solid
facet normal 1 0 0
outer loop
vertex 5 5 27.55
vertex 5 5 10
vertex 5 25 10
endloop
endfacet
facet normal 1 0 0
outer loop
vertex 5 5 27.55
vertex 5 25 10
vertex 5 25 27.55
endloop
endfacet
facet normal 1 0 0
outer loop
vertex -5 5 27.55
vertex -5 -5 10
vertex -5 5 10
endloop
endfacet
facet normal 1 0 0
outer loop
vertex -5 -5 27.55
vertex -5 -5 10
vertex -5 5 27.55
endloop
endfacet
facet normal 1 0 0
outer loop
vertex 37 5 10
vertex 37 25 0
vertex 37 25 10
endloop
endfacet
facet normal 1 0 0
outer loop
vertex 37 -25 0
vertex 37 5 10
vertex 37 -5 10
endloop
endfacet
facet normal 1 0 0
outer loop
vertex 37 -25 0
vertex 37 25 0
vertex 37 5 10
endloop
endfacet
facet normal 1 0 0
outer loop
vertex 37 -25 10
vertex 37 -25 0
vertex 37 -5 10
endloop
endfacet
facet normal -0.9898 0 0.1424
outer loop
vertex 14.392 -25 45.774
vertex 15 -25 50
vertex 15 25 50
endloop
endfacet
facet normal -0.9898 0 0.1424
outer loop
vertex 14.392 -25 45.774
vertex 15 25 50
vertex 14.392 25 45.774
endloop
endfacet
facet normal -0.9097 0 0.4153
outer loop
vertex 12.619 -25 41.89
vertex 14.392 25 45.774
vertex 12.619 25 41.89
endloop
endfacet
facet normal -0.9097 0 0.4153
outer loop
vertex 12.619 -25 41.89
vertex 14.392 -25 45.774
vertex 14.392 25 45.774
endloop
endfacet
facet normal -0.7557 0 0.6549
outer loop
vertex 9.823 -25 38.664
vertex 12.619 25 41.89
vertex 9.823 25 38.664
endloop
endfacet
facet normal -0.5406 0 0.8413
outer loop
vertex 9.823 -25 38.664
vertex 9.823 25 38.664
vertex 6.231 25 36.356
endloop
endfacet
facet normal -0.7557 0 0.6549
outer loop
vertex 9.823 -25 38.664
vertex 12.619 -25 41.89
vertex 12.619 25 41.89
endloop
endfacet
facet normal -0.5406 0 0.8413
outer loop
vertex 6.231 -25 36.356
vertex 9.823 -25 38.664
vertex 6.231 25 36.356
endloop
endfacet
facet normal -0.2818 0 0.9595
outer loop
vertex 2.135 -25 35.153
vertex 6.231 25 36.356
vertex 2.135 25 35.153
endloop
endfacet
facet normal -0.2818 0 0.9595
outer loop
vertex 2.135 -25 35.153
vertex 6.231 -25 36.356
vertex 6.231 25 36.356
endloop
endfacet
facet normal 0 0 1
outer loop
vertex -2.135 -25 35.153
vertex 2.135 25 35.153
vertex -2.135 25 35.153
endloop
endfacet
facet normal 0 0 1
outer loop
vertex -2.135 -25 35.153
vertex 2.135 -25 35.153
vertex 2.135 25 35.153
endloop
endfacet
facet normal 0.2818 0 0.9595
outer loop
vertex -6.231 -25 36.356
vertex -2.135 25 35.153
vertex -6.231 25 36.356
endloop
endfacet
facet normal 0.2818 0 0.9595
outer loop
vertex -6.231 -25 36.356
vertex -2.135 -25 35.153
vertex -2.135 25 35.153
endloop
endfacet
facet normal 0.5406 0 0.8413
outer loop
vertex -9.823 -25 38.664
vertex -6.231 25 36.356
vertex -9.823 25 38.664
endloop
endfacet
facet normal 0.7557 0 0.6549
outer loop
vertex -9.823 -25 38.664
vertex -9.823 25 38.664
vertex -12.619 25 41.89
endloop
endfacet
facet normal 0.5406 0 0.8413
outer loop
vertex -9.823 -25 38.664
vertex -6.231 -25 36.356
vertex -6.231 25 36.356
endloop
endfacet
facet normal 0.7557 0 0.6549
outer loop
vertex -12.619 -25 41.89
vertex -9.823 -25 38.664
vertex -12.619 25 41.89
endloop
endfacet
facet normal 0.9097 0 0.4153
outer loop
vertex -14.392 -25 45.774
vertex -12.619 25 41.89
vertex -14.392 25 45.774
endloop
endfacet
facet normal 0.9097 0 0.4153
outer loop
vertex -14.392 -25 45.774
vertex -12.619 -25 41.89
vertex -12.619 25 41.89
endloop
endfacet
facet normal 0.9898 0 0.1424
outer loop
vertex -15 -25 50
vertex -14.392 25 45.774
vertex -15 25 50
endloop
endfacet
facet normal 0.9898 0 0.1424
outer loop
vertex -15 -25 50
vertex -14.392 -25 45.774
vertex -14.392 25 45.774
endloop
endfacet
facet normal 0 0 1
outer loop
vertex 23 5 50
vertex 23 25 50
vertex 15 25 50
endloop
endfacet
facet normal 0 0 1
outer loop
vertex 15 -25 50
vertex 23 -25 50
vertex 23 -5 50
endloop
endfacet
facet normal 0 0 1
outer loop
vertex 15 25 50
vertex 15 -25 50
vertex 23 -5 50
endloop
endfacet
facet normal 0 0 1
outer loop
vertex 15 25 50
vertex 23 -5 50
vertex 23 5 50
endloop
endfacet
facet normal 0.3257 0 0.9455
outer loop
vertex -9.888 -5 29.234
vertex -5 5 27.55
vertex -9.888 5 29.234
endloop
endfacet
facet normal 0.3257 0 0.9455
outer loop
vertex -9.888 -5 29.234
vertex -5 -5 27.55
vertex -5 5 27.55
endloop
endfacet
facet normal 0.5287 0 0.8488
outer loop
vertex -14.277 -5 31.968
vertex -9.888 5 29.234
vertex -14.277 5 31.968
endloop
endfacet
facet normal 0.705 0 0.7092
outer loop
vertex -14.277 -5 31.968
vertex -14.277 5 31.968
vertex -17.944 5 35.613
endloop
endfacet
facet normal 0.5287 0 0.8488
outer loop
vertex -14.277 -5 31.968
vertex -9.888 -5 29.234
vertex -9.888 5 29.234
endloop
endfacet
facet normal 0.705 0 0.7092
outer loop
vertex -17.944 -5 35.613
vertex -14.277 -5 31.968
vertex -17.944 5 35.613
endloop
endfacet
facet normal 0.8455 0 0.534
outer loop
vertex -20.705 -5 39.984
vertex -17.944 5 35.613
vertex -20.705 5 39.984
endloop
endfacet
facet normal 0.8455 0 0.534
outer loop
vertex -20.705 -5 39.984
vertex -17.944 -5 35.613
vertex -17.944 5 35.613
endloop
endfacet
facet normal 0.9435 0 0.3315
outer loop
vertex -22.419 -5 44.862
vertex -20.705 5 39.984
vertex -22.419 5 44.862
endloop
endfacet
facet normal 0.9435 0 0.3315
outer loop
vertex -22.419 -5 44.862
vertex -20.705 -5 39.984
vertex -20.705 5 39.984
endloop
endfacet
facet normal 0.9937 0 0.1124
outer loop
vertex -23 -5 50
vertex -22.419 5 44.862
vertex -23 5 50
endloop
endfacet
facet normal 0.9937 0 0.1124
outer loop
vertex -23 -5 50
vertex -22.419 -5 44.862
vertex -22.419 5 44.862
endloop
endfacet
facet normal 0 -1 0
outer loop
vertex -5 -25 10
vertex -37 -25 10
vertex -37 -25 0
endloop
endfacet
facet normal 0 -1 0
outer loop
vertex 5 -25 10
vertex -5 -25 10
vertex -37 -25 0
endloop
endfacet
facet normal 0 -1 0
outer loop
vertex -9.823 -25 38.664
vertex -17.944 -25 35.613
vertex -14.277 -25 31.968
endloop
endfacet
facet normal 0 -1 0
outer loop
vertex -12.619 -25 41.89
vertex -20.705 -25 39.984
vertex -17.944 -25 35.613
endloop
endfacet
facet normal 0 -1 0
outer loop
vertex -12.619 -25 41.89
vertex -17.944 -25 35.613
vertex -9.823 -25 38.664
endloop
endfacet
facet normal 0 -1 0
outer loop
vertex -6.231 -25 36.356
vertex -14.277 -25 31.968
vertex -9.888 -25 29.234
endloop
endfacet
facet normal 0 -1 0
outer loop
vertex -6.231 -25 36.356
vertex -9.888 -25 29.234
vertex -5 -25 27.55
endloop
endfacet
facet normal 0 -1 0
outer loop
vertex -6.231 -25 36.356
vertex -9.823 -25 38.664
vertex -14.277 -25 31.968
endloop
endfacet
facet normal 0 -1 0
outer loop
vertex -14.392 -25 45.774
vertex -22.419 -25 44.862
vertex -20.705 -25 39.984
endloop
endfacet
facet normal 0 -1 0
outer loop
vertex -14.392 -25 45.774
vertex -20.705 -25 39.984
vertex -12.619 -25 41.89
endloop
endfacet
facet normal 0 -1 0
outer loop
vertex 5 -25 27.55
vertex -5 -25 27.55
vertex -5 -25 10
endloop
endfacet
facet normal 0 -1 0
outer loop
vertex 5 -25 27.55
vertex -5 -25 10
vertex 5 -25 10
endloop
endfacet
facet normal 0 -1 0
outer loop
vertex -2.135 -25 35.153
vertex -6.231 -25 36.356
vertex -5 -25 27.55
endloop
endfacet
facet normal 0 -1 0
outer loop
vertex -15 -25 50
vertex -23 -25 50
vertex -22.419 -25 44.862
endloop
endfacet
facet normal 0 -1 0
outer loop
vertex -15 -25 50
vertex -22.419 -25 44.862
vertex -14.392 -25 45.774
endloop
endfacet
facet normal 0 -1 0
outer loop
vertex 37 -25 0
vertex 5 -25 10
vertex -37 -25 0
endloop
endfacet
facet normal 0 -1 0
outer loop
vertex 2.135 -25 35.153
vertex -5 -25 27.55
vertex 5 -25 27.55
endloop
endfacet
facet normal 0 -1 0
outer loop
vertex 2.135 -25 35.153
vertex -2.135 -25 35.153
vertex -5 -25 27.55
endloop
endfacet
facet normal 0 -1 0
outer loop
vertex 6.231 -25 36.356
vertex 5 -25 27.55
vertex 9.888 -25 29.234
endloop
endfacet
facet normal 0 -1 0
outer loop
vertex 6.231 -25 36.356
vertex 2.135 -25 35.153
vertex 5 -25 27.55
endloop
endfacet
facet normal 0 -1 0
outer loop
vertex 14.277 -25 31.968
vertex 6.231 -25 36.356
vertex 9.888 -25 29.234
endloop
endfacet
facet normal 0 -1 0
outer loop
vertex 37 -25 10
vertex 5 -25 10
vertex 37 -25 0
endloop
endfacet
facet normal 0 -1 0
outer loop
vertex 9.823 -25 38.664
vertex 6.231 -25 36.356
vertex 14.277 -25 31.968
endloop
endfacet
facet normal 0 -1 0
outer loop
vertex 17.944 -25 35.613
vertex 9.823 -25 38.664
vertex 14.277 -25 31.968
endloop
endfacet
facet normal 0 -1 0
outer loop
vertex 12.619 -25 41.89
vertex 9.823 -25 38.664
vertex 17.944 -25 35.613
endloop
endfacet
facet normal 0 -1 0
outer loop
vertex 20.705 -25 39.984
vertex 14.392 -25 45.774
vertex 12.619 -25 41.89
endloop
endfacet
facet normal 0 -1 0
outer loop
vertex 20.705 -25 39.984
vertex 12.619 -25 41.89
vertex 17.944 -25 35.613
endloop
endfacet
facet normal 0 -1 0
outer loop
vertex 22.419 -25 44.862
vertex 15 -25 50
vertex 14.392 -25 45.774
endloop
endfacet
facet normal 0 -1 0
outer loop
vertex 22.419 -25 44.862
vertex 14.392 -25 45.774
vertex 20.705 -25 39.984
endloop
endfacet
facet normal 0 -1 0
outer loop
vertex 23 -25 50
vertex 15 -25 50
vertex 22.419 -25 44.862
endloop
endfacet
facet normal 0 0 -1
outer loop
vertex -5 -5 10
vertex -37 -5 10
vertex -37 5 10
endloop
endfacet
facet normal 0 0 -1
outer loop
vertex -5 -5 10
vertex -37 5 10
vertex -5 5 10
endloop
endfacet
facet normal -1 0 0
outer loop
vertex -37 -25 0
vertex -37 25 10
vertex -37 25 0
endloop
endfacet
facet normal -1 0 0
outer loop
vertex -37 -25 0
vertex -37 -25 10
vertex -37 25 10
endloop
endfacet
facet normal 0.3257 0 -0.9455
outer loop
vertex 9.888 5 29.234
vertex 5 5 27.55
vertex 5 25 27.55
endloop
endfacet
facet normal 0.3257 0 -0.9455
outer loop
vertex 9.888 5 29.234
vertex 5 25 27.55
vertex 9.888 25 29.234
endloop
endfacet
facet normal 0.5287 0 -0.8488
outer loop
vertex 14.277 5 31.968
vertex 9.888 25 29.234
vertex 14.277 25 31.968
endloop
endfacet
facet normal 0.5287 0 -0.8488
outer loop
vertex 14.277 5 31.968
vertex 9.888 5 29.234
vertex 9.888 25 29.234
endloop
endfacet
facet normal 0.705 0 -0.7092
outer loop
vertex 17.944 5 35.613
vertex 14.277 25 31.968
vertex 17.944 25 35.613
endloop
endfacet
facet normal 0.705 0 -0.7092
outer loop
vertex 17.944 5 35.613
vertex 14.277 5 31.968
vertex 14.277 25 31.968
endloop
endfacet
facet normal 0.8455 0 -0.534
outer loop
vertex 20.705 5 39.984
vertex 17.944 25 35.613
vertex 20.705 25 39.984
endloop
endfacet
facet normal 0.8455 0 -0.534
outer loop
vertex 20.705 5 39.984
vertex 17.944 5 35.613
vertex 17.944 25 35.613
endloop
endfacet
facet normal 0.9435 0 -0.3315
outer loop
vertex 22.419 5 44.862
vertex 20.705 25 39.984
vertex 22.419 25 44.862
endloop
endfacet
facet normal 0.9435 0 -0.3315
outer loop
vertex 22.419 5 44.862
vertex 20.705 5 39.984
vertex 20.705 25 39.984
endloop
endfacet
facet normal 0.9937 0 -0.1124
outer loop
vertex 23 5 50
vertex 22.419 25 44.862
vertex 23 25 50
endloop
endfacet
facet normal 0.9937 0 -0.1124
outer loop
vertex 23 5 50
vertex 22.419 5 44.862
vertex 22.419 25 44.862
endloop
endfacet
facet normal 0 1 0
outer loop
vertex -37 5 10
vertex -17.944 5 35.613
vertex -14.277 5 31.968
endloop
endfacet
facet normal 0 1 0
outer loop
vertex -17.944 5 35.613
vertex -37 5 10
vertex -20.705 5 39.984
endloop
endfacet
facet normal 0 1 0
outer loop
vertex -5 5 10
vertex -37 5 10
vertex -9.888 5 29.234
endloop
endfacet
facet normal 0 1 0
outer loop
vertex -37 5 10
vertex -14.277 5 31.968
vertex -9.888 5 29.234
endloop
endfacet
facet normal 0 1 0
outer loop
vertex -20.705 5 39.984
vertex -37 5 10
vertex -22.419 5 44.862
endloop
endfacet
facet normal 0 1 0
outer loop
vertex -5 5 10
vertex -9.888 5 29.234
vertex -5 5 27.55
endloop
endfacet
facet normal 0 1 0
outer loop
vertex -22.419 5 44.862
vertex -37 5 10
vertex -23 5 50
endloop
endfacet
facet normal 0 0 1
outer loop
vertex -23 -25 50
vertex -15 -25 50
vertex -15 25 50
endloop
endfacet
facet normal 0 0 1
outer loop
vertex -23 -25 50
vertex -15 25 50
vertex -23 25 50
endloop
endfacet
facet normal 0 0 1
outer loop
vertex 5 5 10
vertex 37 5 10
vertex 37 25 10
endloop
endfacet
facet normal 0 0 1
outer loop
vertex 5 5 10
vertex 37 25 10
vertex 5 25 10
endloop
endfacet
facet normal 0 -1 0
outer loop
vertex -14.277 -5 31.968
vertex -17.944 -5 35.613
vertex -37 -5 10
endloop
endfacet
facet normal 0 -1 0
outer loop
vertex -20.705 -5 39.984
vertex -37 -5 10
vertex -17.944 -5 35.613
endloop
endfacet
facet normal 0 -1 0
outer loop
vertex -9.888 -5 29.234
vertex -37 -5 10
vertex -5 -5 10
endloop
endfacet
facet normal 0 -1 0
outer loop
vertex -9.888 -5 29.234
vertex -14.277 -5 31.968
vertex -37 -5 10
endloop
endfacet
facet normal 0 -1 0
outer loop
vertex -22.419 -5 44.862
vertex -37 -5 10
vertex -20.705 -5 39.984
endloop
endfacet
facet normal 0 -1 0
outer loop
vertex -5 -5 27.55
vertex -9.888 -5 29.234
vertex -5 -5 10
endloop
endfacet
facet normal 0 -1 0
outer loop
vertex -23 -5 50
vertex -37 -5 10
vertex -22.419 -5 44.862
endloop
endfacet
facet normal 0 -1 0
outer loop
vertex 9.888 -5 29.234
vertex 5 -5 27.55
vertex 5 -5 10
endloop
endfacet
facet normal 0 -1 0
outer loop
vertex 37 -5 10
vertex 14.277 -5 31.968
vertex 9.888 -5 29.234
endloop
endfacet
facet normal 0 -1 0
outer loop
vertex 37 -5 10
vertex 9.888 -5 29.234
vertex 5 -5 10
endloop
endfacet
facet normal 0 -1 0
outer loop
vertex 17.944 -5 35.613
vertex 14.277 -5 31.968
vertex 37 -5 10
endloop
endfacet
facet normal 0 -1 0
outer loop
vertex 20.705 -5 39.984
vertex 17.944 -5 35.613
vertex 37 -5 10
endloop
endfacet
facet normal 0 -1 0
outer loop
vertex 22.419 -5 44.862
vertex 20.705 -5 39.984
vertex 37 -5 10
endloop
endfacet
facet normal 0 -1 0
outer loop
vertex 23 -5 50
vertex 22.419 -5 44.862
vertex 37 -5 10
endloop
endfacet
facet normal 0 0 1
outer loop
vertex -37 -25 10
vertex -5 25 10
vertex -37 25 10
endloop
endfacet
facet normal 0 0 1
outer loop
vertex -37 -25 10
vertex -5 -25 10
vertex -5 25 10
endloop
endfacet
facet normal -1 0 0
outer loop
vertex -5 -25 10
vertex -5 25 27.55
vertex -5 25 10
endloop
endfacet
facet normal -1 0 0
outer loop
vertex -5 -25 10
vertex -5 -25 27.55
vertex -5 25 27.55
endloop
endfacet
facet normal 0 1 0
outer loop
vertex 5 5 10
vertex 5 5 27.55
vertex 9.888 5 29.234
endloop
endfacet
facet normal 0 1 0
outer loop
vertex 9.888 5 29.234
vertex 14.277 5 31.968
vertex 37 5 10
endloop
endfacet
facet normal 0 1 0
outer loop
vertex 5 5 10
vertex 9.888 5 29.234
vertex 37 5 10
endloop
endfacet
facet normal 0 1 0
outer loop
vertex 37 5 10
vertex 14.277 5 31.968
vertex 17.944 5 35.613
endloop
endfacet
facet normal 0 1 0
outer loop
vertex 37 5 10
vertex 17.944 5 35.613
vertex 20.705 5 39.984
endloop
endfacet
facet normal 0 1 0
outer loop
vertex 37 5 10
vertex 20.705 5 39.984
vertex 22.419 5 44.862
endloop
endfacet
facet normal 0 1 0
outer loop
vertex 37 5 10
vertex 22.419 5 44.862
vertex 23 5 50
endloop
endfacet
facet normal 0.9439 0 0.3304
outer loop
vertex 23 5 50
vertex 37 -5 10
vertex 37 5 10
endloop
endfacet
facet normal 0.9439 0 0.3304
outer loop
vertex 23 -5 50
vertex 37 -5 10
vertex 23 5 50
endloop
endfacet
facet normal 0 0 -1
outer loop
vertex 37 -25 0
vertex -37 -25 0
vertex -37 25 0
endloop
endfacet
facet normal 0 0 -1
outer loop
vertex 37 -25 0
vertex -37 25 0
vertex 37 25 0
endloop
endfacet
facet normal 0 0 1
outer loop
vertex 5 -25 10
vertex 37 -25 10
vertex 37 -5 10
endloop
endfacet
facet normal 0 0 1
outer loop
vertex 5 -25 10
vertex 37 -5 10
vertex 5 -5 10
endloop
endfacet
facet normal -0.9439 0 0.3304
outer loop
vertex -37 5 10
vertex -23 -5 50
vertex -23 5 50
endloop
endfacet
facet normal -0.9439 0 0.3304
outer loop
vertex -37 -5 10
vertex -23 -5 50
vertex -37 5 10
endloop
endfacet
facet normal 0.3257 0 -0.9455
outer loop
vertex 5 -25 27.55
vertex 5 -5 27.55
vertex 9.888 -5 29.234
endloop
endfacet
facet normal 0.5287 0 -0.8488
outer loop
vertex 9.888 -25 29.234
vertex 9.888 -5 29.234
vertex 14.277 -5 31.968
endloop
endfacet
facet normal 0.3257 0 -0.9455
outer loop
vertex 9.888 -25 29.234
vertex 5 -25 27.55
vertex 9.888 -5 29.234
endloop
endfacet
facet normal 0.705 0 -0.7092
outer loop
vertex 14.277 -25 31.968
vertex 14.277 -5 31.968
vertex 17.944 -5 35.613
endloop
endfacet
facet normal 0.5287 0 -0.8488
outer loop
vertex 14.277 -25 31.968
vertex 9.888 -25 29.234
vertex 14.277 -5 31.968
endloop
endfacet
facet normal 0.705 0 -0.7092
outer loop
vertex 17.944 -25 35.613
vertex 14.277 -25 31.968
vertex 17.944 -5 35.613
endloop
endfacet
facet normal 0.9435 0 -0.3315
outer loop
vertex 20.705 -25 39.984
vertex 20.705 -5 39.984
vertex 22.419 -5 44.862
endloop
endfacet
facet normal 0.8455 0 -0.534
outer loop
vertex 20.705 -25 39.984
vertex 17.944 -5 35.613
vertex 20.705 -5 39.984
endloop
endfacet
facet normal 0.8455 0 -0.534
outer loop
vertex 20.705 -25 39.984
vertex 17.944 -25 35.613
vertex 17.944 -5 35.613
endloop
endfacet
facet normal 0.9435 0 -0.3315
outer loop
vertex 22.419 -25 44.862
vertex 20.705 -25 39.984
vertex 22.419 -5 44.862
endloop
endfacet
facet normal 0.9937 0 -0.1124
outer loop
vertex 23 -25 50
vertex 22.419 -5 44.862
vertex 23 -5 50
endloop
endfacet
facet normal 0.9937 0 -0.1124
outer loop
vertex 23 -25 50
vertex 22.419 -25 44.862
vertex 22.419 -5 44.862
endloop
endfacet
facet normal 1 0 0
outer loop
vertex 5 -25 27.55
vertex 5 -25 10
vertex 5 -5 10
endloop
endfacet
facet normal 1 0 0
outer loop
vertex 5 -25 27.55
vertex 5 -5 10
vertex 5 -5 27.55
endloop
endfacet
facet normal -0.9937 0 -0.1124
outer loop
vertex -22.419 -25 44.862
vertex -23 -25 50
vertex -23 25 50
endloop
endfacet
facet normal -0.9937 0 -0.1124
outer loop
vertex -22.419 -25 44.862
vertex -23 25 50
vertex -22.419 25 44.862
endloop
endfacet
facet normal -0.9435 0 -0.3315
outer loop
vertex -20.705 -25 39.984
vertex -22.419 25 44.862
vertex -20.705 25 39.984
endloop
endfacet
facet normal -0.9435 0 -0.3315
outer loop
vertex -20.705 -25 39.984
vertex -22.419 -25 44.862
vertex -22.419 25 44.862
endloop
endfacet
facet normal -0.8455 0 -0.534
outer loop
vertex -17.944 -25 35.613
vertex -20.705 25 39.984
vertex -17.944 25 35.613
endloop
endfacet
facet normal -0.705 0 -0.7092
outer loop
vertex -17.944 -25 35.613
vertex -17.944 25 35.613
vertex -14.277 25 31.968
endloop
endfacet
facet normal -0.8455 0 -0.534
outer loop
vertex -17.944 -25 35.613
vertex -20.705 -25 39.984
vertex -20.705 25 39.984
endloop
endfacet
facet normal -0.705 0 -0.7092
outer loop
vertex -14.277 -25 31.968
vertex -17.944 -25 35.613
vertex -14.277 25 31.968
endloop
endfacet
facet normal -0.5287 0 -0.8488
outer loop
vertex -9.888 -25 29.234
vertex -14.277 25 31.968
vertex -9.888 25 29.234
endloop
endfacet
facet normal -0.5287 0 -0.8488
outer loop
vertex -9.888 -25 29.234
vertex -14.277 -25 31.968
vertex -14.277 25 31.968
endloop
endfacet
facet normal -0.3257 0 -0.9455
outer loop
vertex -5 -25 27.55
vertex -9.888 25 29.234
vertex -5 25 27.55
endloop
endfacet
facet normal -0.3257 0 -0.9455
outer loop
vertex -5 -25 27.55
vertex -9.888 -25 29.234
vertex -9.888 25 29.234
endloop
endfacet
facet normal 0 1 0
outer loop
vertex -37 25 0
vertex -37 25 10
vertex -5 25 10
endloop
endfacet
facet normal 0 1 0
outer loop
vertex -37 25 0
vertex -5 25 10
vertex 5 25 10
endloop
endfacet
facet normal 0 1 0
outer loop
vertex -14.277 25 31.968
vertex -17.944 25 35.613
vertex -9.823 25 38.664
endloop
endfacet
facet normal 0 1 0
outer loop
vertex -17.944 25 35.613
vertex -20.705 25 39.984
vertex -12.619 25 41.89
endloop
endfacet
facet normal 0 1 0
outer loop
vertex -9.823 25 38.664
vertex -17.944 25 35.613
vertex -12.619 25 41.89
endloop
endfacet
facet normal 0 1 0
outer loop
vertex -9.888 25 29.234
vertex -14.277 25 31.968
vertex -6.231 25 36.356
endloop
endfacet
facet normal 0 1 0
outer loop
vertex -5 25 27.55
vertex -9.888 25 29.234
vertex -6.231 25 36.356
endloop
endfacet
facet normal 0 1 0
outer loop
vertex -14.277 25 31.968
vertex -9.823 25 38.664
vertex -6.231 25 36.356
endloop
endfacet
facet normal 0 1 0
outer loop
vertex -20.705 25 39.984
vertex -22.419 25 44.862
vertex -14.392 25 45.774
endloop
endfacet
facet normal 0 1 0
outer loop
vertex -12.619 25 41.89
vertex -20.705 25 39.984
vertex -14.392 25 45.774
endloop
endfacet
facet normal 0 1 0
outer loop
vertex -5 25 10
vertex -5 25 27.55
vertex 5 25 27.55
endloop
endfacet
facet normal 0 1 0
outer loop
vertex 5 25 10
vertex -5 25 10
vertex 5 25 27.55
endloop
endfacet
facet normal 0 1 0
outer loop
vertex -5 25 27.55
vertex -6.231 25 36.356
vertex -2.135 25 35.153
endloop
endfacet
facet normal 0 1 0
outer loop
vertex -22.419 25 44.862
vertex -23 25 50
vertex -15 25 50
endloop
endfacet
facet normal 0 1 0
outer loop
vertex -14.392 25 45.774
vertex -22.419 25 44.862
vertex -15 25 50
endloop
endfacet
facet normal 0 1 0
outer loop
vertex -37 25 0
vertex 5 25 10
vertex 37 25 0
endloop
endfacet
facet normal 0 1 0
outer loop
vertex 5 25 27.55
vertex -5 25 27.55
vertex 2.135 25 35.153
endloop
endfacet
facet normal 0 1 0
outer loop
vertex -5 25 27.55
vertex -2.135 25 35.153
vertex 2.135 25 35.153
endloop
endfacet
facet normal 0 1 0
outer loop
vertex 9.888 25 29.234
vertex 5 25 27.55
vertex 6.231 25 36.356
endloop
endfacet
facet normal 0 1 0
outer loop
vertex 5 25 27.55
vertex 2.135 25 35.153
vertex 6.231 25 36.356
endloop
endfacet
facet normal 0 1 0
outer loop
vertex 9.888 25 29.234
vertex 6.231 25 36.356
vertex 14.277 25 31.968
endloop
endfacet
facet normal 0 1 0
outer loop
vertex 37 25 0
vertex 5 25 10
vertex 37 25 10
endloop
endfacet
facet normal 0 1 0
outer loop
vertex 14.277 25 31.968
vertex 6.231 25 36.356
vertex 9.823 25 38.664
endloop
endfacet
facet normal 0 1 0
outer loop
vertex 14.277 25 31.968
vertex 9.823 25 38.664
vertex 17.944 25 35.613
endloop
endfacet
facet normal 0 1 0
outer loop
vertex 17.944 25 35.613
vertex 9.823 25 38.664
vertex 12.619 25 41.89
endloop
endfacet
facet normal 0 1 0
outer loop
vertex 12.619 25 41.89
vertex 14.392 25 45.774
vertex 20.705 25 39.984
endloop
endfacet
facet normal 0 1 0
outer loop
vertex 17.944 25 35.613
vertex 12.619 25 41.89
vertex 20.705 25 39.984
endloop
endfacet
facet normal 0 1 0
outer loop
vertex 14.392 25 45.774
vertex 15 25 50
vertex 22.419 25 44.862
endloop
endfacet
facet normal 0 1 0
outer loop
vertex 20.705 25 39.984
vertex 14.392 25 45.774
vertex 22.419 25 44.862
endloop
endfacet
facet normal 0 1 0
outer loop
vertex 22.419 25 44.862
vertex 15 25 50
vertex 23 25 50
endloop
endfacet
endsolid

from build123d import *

# Parameters (mm, degrees)
F1_DEPTH = 25
F3_DEPTH = 5
F5_DEPTH = 5


with BuildPart() as f1:
    # F0 (on Front) → F1 (new body, symmetric)
    with BuildSketch(Plane.XZ):
        with BuildLine():
            Line((-37, 10), (-37, 0))
            Line((-37, 0), (0, 0))
            Line((0, 0), (37, 0))
            Line((37, 0), (37, 10))
            Line((37, 10), (5, 10))
            Line((5, 10), (5, 27))
            Line((5, 27), (5, 27.550056))
            ThreePointArc((5, 27.550056), (17.944358, 35.612505), (23, 50))
            Line((23, 50), (15, 50))
            ThreePointArc((15, 50), (0, 35), (-15, 50))
            Line((-15, 50), (-23, 50))
            ThreePointArc((-23, 50), (-17.944358, 35.612505), (-5, 27.550056))
            Line((-5, 27.550056), (-5, 23.140989))
            Line((-5, 23.140989), (-5, 10))
            Line((-5, 10), (-37, 10))
        make_face()
    extrude(amount=F1_DEPTH, both=True)

    # F4 (on Front) → F5 (join, symmetric)
    with BuildSketch(Plane.XZ):
        with BuildLine():
            ThreePointArc((23, 50), (17.944358, 35.612505), (5, 27.550056))
            Line((5, 27.550056), (5, 10))
            Line((5, 10), (37, 10))
            Line((37, 10), (23, 50))
        make_face()
    extrude(amount=F5_DEPTH, both=True)


with BuildPart() as f3:
    # F2 (on Front) → F3 (new body, symmetric)
    with BuildSketch(Plane.XZ):
        with BuildLine():
            ThreePointArc((-5, 27.550056), (-17.944358, 35.612505), (-23, 50))
            Line((-23, 50), (-37, 10))
            Line((-37, 10), (-5, 10))
            Line((-5, 10), (-5, 27.550056))
        make_face()
    extrude(amount=F3_DEPTH, both=True)


solid = Compound([f1.part, f3.part])
